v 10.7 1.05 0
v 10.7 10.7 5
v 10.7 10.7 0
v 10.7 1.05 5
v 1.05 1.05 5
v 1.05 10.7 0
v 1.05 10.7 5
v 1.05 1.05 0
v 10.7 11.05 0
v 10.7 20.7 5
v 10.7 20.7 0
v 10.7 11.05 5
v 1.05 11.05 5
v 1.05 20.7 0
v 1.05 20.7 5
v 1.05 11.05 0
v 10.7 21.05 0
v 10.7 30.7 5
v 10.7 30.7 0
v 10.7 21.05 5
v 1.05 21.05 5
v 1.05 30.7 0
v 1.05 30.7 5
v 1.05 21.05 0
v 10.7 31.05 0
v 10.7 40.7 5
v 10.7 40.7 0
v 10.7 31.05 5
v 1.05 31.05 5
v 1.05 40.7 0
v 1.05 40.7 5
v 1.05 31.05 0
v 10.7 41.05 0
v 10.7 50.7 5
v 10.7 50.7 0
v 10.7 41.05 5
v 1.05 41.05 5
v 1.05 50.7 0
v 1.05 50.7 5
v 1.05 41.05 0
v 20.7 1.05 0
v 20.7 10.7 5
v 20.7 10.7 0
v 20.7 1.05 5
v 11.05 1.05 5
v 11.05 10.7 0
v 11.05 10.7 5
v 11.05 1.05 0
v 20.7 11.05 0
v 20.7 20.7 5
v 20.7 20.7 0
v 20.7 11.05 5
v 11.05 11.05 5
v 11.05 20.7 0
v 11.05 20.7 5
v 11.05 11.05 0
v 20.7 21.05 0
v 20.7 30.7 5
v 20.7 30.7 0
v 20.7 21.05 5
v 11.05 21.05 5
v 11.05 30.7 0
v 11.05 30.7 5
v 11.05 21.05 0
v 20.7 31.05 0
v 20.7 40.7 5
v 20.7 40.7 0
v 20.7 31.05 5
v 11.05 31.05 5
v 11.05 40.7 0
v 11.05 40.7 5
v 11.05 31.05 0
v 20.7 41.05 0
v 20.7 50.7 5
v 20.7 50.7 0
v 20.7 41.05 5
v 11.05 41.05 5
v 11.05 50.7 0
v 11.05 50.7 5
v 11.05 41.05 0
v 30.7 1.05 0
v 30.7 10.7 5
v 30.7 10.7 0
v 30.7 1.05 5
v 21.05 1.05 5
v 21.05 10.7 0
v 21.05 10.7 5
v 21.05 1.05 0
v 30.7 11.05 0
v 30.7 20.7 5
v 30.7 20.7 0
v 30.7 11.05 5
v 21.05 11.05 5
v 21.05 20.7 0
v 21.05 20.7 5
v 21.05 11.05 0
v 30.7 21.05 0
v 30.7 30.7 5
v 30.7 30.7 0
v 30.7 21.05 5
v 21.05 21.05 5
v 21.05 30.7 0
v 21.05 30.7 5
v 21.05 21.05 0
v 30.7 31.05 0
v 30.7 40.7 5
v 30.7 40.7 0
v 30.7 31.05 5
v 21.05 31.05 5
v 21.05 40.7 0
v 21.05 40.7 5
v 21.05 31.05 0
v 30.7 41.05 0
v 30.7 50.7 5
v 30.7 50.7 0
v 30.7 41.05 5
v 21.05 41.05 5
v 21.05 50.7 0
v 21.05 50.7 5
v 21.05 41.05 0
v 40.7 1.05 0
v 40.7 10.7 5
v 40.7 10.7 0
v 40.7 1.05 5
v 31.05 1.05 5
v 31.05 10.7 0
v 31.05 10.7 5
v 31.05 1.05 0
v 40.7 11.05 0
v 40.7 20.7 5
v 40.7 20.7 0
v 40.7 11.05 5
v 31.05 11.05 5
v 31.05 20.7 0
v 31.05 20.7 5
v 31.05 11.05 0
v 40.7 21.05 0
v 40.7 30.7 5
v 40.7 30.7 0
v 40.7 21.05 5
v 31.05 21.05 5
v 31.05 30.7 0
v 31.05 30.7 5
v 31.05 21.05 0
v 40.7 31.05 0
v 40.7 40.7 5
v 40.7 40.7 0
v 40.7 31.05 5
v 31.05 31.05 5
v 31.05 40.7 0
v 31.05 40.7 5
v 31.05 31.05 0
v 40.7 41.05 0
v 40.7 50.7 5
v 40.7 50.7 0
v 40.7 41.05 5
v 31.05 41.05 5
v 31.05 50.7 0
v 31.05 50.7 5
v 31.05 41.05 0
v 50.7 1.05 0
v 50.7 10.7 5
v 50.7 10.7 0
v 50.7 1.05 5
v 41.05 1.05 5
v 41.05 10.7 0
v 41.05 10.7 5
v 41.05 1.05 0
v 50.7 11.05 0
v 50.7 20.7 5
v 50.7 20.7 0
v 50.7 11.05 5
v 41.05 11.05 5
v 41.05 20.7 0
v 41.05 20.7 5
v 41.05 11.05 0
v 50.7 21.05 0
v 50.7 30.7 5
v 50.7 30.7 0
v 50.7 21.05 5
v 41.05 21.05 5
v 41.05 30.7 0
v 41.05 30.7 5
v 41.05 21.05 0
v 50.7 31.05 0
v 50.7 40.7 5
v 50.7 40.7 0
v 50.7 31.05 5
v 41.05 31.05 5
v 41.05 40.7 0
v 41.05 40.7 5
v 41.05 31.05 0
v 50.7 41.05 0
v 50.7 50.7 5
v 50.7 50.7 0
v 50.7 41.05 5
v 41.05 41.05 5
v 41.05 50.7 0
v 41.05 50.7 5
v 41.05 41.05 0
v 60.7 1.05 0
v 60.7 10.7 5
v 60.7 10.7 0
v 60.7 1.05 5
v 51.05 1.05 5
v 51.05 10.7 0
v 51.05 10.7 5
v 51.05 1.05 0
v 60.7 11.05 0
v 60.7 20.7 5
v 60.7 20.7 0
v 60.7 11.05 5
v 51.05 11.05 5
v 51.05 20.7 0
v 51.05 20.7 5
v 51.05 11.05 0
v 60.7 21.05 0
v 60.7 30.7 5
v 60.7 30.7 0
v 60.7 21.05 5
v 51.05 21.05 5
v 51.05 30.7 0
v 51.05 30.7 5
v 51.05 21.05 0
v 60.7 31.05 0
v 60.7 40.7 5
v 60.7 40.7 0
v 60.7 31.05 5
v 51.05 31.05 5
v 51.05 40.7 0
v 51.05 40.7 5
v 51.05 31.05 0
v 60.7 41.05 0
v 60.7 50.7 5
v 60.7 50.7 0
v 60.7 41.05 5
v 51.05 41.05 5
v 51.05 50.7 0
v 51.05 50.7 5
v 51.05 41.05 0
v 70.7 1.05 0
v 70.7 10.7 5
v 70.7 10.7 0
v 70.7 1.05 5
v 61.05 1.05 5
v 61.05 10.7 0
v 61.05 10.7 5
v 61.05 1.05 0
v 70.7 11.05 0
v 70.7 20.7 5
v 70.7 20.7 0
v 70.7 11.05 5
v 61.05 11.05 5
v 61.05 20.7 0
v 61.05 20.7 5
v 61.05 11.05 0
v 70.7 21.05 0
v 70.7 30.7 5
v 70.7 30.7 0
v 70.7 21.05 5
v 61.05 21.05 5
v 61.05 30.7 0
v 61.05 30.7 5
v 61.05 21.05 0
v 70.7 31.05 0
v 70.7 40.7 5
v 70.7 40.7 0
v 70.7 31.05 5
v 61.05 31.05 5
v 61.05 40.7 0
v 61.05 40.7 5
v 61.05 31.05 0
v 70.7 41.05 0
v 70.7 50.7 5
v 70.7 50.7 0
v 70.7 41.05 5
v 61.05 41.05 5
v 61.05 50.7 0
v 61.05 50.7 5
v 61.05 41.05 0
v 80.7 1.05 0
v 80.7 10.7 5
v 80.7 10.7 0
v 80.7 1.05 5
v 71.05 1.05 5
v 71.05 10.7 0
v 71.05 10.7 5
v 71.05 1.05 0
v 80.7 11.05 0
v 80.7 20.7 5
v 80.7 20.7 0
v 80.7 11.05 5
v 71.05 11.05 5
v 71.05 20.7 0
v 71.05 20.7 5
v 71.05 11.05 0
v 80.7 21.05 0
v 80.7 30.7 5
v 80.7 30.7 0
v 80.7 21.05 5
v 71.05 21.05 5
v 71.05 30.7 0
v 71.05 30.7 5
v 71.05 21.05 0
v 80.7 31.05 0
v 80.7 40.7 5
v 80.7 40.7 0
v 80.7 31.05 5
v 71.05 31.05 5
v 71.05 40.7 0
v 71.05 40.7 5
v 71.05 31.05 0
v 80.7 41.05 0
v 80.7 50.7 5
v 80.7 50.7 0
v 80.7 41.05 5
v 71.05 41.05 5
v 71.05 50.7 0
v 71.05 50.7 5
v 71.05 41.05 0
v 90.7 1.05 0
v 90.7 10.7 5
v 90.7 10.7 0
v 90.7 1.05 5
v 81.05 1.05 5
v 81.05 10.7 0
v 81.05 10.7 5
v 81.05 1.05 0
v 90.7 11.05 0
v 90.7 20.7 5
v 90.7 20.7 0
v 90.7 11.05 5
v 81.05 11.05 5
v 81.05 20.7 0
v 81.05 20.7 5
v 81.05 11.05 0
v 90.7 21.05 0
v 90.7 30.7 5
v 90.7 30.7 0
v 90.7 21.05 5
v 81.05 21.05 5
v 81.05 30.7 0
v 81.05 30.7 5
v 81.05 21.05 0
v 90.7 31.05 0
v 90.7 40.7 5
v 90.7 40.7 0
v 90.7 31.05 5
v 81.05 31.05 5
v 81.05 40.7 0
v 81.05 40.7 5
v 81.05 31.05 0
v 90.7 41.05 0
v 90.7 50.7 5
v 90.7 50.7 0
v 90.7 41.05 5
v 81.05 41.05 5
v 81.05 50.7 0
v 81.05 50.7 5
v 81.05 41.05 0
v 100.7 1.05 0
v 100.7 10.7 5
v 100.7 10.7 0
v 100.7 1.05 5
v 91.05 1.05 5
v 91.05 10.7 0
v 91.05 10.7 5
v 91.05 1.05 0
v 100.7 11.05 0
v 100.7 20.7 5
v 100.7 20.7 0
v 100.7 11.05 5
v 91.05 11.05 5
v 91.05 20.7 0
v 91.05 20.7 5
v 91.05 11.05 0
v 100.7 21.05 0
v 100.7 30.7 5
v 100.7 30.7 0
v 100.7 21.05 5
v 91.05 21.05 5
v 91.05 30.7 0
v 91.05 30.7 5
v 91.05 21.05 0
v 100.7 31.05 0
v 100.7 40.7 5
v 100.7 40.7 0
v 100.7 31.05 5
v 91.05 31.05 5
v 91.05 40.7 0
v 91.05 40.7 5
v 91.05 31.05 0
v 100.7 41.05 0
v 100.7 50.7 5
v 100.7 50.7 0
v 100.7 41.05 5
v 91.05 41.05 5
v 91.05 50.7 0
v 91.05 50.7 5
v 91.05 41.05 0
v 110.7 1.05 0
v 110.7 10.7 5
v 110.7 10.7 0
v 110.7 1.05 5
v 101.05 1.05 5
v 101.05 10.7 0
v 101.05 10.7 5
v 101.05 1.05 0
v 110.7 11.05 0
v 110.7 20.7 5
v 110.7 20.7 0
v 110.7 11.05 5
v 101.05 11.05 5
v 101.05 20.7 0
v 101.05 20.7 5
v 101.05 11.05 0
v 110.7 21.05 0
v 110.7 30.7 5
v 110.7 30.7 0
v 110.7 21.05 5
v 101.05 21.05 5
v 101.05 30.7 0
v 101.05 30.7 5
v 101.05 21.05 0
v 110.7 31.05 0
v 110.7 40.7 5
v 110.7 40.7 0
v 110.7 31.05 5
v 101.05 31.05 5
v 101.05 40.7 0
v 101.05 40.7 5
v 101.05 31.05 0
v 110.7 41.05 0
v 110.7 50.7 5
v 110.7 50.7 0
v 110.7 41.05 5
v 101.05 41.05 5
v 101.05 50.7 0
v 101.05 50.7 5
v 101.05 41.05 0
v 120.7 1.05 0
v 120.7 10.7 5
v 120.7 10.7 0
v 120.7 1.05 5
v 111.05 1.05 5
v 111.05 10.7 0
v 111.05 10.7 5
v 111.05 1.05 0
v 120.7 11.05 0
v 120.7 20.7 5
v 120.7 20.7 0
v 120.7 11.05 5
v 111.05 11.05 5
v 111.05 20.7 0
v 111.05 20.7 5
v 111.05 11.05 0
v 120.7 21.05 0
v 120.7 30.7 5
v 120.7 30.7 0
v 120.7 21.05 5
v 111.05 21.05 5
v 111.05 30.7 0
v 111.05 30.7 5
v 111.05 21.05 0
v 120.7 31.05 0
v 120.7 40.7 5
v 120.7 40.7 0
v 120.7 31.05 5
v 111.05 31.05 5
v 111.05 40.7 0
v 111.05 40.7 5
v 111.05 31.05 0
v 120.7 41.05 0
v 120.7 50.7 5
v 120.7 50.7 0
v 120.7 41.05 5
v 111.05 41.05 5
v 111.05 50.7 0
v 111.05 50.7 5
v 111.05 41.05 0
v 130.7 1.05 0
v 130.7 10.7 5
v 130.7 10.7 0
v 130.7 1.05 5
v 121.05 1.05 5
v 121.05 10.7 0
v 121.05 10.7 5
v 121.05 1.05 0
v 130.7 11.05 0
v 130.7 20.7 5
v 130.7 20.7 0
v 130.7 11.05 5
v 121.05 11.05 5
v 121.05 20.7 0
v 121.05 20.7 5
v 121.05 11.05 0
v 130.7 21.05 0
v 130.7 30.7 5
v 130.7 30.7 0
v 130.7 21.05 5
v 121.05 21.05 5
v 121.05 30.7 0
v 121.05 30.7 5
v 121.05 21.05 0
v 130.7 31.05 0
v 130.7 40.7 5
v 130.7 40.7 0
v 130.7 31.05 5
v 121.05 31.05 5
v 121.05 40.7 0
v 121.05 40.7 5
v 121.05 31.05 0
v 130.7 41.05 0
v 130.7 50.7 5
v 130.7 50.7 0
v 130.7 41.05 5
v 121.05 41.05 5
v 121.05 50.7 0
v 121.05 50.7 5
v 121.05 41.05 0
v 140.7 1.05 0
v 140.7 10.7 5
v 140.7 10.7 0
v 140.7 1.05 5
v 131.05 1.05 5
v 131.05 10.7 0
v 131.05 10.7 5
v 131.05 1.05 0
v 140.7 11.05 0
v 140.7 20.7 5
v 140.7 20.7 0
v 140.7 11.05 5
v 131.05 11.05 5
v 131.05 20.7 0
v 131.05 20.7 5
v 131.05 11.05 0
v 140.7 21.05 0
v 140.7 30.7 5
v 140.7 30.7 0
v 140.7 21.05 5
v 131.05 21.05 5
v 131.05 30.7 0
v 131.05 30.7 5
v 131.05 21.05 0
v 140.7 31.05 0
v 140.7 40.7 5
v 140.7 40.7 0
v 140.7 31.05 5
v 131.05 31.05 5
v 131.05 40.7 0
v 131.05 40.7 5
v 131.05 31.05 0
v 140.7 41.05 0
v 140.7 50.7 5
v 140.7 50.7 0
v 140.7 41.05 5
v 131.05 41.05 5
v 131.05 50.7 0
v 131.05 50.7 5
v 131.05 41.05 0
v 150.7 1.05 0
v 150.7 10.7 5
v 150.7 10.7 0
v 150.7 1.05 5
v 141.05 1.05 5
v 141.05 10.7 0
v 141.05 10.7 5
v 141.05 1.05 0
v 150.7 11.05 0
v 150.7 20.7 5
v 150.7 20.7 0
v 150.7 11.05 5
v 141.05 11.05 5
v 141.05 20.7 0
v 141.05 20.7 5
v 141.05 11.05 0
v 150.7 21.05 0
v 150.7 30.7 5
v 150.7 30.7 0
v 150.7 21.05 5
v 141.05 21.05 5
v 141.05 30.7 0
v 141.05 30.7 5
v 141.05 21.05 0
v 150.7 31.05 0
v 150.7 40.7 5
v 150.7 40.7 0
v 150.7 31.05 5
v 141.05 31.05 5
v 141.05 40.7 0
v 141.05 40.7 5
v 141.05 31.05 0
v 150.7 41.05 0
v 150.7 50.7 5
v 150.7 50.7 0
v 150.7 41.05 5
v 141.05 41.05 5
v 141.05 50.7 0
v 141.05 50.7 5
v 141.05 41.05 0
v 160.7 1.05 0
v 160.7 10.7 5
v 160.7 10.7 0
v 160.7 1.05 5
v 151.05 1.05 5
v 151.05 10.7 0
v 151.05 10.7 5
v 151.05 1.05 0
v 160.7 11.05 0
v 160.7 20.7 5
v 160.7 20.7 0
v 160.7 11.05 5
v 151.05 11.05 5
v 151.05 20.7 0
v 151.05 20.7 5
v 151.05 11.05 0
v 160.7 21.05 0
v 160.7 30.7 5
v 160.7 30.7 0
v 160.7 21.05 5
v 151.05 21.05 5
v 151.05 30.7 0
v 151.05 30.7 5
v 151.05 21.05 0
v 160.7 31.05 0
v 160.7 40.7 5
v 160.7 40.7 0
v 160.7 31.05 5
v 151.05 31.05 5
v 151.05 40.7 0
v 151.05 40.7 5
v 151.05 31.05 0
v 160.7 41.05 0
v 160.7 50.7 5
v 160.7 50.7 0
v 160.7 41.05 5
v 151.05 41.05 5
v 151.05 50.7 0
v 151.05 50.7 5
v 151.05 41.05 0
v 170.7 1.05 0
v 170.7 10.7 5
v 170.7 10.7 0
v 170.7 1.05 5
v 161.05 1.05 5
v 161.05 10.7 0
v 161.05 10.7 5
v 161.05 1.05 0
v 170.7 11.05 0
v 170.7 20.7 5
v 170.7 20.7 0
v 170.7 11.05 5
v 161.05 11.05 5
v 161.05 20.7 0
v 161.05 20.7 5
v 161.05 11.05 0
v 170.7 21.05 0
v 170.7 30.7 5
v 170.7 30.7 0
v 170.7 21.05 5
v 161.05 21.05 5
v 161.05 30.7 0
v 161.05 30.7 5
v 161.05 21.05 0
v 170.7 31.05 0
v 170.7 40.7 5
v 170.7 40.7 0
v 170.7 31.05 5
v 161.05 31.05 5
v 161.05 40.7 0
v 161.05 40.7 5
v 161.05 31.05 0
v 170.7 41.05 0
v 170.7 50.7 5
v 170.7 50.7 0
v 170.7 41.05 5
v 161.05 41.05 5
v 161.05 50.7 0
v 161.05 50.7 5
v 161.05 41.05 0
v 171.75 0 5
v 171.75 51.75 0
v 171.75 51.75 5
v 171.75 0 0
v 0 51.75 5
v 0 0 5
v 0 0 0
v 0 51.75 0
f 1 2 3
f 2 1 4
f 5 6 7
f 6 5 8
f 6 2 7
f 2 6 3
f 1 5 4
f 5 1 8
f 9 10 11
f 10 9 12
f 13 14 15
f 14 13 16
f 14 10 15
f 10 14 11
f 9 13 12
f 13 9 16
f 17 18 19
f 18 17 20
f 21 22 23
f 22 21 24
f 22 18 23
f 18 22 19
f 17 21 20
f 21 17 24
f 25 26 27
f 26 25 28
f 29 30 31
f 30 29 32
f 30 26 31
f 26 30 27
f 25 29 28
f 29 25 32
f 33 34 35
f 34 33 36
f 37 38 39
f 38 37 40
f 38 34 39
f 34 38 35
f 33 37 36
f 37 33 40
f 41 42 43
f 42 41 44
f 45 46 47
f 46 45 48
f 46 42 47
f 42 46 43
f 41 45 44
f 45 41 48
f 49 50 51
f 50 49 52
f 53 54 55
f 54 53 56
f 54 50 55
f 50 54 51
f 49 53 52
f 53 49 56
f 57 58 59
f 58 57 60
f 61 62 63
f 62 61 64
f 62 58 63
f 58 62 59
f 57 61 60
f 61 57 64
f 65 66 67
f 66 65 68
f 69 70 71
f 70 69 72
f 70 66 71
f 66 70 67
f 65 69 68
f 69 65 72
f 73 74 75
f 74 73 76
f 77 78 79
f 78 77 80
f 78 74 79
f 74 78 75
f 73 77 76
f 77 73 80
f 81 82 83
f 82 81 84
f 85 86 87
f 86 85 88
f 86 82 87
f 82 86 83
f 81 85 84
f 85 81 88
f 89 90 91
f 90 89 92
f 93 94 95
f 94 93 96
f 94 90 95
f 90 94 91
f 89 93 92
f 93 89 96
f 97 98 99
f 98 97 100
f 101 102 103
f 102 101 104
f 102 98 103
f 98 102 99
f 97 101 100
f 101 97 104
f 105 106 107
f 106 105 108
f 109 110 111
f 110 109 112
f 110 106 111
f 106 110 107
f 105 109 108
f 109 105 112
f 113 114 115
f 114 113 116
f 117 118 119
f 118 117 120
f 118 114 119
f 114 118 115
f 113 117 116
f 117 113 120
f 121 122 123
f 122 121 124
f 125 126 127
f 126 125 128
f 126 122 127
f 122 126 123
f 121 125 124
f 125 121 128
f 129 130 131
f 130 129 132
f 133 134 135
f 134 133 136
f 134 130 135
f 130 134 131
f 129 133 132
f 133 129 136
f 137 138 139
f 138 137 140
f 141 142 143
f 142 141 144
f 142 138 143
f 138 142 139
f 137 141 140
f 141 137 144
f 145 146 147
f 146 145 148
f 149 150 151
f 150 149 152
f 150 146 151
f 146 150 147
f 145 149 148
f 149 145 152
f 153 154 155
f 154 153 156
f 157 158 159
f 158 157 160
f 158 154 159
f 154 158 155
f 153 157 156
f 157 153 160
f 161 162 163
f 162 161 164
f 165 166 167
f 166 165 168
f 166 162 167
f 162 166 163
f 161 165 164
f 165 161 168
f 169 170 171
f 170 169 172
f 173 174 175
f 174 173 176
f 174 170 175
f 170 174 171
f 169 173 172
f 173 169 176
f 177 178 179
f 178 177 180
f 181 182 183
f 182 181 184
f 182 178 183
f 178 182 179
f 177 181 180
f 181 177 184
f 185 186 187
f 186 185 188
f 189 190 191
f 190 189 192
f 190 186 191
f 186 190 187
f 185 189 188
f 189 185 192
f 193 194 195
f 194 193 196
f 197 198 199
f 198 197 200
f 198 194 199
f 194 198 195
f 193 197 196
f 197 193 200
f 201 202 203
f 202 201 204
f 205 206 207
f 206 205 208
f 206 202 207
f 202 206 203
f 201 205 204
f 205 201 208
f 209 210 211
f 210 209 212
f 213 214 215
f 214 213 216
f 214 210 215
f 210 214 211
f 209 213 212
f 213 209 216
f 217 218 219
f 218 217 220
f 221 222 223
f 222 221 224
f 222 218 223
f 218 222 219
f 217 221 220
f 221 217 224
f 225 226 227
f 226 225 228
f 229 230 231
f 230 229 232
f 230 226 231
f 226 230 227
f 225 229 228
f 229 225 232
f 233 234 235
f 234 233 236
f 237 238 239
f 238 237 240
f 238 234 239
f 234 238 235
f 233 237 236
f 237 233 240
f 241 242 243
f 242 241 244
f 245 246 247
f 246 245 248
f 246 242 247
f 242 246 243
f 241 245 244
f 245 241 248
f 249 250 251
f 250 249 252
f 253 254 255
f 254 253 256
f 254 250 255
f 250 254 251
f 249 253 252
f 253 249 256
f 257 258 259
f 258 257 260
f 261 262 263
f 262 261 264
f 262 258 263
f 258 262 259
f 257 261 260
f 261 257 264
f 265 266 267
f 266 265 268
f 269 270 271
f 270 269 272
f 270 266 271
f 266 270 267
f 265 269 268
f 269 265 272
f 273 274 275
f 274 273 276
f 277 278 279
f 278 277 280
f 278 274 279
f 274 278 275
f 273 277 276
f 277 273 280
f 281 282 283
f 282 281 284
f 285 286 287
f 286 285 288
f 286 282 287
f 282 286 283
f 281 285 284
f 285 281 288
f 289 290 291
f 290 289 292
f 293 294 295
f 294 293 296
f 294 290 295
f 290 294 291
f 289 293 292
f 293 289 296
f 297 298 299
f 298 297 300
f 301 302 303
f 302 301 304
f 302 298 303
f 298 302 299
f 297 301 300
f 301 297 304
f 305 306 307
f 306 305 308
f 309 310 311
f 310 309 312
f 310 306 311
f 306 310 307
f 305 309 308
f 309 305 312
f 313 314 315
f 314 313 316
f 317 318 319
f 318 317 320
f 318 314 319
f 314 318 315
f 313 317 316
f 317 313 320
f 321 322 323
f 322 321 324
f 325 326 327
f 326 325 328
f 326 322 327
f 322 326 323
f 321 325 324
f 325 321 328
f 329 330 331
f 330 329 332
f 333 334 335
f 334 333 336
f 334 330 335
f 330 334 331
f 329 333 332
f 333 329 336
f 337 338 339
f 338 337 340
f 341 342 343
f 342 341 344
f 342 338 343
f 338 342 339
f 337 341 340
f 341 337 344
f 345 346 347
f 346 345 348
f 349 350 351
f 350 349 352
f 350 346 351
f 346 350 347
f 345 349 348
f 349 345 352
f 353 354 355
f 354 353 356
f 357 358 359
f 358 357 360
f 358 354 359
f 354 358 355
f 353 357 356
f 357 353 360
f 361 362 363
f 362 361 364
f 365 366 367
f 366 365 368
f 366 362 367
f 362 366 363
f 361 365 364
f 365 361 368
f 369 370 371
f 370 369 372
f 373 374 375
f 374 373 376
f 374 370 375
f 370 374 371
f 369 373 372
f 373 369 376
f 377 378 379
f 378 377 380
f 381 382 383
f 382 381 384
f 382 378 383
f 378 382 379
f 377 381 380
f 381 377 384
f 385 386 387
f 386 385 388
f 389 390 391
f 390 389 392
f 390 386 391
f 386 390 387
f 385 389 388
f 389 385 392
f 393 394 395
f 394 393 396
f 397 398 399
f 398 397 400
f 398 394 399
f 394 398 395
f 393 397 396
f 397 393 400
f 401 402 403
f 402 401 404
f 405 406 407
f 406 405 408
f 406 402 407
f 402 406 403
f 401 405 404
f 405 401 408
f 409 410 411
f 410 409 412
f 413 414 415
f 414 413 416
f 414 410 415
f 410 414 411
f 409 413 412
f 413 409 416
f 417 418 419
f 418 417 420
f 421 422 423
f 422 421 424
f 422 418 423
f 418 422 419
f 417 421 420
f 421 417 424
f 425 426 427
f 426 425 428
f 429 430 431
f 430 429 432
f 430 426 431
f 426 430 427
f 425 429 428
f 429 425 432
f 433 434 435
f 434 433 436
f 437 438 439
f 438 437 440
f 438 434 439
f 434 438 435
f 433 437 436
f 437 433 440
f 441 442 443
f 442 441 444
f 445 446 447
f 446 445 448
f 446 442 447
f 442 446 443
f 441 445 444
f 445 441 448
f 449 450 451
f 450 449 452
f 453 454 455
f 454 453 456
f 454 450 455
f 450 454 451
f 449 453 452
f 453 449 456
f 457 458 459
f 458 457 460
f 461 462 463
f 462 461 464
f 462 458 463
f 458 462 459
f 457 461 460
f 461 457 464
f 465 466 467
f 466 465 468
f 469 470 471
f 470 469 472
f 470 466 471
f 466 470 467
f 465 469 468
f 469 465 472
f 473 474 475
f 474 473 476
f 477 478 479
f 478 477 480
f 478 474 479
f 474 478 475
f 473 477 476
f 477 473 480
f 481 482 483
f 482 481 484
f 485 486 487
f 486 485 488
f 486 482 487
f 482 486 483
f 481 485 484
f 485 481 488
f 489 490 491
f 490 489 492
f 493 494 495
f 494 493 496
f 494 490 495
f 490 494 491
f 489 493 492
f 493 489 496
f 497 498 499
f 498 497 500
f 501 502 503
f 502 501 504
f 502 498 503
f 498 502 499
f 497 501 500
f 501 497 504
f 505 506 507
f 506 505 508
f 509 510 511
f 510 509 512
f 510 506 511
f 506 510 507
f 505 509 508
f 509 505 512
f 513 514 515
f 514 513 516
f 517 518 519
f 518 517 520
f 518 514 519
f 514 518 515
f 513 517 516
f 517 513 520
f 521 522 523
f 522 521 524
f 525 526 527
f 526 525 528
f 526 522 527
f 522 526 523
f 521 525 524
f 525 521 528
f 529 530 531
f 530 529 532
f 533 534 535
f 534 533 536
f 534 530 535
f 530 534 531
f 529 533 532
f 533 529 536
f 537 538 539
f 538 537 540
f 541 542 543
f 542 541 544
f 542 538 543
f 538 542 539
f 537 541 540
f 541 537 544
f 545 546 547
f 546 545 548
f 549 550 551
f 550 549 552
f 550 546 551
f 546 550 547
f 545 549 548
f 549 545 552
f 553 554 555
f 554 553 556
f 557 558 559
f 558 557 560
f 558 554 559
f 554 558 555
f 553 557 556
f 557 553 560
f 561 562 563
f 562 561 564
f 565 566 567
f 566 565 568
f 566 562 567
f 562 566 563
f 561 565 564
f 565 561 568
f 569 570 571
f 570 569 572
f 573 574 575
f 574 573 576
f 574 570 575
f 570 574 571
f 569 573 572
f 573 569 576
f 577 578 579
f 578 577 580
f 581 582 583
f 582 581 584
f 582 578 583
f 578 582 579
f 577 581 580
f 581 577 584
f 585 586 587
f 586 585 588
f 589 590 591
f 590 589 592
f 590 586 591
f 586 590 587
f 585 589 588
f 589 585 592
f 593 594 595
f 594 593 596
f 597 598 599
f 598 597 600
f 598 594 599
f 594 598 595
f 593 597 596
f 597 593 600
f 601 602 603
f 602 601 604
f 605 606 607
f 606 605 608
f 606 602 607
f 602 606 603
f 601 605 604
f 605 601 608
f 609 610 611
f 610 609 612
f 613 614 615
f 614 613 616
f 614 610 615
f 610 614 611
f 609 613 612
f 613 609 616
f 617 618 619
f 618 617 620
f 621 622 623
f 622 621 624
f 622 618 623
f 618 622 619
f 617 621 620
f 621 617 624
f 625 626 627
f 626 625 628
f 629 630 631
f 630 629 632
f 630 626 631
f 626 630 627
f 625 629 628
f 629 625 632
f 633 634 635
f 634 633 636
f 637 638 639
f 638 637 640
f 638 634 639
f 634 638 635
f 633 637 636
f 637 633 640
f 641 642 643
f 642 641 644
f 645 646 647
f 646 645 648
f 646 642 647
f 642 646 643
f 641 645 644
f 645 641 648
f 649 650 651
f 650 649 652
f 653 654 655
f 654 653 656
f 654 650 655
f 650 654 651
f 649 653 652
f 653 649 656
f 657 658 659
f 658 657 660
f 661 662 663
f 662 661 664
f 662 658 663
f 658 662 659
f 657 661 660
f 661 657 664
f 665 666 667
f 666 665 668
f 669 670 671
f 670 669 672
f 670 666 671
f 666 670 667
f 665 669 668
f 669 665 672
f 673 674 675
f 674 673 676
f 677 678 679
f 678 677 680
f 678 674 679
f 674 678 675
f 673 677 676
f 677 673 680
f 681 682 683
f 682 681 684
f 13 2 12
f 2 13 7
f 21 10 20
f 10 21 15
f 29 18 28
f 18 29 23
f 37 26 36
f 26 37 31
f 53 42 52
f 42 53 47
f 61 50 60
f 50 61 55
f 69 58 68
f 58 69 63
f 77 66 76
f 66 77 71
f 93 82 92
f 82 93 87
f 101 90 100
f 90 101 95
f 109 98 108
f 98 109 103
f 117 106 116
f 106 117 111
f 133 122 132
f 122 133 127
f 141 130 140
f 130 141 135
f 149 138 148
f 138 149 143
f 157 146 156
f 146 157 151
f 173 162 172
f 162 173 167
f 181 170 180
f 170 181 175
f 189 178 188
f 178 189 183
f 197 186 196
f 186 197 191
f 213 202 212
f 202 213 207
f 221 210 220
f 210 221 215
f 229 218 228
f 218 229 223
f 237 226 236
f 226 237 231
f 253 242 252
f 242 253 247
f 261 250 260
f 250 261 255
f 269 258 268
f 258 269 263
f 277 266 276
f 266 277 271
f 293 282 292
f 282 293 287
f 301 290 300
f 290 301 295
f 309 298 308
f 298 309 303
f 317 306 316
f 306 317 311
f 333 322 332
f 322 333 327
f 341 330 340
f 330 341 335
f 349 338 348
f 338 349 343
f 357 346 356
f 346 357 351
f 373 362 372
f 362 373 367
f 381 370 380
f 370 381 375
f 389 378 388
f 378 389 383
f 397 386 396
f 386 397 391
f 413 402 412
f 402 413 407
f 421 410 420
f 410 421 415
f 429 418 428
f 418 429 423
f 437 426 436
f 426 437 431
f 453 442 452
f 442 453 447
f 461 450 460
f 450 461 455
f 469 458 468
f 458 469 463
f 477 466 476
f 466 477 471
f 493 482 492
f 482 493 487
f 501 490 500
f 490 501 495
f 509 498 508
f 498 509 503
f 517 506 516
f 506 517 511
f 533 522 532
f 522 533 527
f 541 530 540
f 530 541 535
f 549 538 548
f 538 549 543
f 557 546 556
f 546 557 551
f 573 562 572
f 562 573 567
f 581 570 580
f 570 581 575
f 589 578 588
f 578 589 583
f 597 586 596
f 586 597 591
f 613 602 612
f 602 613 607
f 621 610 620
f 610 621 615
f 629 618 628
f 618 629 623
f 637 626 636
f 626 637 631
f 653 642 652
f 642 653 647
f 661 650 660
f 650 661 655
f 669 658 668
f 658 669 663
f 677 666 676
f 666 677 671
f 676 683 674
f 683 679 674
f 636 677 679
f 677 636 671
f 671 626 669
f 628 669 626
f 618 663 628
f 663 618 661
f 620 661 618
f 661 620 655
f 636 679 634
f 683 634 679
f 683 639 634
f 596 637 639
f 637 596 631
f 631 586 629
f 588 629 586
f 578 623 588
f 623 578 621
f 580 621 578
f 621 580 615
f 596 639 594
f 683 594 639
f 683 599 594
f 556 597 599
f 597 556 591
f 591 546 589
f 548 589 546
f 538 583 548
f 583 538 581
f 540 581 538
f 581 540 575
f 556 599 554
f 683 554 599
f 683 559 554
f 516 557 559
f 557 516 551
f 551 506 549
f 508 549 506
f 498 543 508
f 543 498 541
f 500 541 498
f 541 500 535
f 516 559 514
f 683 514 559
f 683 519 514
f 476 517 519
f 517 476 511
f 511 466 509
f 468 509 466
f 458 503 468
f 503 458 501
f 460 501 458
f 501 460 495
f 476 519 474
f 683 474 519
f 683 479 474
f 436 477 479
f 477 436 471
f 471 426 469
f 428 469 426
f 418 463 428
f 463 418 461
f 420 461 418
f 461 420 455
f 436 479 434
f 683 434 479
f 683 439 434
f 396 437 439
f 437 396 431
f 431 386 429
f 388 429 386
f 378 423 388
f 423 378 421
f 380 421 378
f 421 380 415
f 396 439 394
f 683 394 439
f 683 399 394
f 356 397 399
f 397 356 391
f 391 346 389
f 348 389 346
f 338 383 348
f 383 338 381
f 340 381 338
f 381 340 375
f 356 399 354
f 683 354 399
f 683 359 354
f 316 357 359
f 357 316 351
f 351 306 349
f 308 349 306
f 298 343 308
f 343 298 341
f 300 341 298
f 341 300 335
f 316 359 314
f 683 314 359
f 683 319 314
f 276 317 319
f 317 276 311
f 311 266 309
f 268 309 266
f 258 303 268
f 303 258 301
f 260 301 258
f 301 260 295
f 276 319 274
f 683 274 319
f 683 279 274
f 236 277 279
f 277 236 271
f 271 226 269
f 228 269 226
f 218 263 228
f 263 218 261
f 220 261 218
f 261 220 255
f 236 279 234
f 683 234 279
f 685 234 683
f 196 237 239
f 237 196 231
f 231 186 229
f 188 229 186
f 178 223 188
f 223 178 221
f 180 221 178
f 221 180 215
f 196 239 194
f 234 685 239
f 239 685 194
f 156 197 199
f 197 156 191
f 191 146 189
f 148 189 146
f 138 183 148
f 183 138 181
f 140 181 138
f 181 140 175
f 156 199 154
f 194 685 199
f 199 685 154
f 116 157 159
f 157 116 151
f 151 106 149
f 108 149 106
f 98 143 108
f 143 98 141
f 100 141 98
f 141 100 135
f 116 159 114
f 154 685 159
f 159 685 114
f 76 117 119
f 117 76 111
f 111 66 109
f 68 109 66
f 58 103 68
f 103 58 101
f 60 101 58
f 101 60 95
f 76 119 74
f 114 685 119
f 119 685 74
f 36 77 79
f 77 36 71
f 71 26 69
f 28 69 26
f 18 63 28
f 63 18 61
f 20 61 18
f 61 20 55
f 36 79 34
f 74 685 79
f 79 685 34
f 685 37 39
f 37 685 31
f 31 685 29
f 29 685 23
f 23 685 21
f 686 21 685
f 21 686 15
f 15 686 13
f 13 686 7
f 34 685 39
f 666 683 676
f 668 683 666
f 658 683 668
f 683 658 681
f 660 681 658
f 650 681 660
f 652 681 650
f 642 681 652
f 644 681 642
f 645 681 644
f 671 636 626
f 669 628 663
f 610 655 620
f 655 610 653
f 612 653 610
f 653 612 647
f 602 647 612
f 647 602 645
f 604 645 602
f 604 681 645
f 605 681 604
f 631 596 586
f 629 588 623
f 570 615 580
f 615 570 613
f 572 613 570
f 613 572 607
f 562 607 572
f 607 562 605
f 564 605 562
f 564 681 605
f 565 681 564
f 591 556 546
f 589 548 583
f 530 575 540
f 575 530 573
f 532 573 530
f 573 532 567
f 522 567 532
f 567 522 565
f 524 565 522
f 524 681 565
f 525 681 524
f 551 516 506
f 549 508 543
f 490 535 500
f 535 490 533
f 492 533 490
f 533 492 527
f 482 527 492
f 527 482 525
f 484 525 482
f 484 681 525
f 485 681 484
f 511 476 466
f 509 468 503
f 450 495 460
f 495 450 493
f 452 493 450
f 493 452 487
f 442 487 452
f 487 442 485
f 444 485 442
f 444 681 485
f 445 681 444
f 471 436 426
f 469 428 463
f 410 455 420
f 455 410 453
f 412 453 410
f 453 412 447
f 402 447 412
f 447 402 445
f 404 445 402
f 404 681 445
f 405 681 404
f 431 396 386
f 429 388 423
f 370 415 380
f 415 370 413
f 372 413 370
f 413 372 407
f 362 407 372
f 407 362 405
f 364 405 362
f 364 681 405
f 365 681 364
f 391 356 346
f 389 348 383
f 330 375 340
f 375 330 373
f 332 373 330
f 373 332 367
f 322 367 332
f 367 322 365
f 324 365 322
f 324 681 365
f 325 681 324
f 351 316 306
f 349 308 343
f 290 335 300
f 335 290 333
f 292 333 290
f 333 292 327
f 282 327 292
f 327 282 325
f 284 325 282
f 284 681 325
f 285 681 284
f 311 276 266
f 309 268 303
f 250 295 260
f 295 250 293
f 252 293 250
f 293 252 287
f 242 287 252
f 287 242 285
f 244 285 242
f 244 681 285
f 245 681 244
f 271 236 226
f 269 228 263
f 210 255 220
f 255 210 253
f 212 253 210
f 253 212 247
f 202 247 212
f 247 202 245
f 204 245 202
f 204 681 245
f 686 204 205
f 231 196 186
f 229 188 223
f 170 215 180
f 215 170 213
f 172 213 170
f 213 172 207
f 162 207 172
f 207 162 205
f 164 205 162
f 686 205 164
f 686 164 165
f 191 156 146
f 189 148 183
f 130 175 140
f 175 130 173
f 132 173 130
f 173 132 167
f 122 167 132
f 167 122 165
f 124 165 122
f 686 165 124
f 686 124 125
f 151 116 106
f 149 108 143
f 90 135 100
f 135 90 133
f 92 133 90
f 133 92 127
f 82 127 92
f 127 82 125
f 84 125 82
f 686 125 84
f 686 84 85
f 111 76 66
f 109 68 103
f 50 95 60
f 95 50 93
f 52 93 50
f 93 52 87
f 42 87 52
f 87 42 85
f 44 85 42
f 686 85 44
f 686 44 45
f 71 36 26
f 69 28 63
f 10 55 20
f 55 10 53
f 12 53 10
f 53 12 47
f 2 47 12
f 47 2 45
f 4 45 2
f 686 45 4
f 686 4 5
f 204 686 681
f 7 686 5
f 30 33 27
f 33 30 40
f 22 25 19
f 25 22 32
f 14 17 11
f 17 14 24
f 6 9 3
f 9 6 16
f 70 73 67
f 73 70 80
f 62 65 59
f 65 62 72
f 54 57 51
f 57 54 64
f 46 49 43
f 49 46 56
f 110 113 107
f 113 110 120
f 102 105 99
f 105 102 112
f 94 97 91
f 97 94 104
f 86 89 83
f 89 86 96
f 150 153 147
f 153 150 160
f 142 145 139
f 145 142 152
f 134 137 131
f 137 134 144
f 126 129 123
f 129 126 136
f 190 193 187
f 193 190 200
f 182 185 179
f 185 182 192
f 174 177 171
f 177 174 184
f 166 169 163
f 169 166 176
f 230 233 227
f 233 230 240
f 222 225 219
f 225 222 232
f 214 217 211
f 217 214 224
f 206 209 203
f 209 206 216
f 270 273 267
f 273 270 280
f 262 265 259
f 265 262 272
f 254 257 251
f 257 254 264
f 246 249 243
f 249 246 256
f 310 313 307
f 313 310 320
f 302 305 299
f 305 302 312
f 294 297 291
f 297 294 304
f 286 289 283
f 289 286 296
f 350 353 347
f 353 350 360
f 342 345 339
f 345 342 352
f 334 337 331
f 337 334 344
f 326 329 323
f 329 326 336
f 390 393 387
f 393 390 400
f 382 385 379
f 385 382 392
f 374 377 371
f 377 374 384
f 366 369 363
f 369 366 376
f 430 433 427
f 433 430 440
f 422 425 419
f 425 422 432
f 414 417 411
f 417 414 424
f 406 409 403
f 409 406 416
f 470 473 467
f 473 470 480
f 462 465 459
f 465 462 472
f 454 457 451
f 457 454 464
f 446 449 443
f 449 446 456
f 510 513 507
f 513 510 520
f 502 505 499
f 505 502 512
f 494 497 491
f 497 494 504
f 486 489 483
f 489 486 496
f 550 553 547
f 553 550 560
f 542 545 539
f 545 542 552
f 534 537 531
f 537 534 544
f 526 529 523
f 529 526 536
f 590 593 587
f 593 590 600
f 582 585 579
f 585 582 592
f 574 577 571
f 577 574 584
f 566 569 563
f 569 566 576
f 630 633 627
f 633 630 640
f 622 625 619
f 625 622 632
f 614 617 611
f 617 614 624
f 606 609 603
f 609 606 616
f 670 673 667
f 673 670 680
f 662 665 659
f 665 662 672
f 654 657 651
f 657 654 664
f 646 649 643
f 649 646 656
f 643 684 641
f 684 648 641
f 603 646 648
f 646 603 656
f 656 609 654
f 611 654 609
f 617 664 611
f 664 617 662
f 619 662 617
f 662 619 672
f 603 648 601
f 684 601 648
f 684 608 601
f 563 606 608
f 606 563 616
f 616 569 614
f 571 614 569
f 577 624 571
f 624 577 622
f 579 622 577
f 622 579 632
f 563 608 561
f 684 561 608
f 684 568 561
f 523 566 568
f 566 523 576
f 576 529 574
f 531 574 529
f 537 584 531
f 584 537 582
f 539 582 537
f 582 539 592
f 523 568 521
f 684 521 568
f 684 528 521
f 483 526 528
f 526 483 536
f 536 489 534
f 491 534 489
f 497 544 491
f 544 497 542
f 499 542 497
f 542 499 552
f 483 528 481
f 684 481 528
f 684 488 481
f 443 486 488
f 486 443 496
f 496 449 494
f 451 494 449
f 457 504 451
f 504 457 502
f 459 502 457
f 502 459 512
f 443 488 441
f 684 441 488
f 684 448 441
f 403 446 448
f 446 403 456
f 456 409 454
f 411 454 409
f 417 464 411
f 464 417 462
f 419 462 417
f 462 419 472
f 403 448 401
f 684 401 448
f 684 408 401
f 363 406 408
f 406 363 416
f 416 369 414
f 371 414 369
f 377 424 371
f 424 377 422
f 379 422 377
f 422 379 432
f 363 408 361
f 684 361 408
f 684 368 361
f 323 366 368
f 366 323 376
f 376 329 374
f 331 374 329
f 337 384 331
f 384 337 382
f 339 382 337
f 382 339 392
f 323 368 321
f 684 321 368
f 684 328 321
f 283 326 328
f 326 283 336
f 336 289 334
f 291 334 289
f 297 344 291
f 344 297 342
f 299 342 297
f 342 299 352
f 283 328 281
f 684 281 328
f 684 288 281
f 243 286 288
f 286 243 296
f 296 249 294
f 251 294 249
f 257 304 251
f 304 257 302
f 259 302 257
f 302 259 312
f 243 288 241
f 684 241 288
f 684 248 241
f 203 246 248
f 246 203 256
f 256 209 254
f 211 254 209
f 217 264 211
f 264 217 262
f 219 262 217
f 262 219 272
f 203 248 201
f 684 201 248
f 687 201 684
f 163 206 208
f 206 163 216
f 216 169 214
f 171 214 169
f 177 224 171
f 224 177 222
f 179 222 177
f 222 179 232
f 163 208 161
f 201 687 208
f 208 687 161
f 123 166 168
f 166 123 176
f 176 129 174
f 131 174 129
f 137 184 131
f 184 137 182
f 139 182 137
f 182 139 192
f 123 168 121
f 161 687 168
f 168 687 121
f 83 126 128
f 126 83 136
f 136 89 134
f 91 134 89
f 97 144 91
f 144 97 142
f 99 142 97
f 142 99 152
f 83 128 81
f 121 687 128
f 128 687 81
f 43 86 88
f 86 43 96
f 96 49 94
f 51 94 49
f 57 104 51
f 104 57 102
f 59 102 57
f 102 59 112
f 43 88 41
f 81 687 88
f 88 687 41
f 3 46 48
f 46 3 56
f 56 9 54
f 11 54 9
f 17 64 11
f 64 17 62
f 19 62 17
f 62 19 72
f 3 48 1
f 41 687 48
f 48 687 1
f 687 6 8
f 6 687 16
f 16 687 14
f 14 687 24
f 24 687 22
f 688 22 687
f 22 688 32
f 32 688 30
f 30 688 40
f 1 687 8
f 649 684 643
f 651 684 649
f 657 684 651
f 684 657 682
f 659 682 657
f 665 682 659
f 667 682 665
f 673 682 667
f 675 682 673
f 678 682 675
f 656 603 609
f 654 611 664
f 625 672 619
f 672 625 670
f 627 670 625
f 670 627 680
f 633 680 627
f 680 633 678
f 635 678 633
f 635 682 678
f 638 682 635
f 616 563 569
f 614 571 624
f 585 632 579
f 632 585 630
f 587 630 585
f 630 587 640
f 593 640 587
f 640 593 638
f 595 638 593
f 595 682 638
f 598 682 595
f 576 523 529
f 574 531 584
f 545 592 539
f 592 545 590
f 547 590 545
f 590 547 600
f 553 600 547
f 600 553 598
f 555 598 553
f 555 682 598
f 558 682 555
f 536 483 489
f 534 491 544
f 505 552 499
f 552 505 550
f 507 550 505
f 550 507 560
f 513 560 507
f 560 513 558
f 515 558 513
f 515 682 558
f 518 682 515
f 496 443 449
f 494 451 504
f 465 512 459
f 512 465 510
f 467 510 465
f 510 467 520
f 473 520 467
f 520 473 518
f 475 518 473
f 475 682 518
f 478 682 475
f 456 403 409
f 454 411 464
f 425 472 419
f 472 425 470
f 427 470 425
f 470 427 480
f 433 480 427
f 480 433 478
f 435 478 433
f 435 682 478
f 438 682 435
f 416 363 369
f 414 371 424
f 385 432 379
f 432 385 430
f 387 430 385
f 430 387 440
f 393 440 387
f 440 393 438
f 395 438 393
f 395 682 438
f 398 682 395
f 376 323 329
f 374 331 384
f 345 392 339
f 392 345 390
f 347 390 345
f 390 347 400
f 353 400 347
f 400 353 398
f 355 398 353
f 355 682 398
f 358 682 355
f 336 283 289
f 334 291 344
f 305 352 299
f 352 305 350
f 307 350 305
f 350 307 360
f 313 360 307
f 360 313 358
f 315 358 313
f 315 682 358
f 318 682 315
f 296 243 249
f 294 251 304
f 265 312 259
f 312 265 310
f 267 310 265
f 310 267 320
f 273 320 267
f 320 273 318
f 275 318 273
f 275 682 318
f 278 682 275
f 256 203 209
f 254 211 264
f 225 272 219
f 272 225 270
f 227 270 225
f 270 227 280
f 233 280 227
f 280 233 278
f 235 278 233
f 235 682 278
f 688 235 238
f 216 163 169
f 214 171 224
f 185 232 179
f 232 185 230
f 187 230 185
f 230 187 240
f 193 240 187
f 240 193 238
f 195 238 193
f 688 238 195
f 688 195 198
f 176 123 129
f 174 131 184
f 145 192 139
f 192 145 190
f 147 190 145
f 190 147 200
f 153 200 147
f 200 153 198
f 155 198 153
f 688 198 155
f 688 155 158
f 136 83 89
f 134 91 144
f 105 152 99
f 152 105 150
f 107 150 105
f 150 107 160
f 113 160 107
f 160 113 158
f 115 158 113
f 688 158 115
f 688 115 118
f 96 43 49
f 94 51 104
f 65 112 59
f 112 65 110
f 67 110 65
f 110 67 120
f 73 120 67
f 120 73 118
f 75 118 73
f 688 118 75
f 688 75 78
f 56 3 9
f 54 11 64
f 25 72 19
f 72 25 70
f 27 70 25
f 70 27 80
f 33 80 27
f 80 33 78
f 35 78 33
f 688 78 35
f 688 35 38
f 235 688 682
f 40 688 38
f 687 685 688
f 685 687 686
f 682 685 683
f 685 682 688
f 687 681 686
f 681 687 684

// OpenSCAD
cellHorPeriod = 10;
cellVertPeriod = 10;
bordHorThick = 0.7;
bordVertThick = 0.7;
horThick = 0.7;
verThick = 0.7;
horCells = 17;
vertCells = 5;
gridHeight = 5;

difference() {
	cube([horCells*cellHorPeriod+horThick/2+2*bordVertThick,vertCells*cellVertPeriod+verThick/2+2*bordHorThick,gridHeight]);

    for (i = [0:horCells-1]) {
        for (j = [0:vertCells-1]) {
            translate([i*cellHorPeriod + horThick/2 + bordVertThick, j*cellVertPeriod + verThick/2 + bordHorThick, -gridHeight]) {
                cube([cellHorPeriod - horThick/2, cellVertPeriod - verThick/2, gridHeight*3]);
            }
        }
    }

}
